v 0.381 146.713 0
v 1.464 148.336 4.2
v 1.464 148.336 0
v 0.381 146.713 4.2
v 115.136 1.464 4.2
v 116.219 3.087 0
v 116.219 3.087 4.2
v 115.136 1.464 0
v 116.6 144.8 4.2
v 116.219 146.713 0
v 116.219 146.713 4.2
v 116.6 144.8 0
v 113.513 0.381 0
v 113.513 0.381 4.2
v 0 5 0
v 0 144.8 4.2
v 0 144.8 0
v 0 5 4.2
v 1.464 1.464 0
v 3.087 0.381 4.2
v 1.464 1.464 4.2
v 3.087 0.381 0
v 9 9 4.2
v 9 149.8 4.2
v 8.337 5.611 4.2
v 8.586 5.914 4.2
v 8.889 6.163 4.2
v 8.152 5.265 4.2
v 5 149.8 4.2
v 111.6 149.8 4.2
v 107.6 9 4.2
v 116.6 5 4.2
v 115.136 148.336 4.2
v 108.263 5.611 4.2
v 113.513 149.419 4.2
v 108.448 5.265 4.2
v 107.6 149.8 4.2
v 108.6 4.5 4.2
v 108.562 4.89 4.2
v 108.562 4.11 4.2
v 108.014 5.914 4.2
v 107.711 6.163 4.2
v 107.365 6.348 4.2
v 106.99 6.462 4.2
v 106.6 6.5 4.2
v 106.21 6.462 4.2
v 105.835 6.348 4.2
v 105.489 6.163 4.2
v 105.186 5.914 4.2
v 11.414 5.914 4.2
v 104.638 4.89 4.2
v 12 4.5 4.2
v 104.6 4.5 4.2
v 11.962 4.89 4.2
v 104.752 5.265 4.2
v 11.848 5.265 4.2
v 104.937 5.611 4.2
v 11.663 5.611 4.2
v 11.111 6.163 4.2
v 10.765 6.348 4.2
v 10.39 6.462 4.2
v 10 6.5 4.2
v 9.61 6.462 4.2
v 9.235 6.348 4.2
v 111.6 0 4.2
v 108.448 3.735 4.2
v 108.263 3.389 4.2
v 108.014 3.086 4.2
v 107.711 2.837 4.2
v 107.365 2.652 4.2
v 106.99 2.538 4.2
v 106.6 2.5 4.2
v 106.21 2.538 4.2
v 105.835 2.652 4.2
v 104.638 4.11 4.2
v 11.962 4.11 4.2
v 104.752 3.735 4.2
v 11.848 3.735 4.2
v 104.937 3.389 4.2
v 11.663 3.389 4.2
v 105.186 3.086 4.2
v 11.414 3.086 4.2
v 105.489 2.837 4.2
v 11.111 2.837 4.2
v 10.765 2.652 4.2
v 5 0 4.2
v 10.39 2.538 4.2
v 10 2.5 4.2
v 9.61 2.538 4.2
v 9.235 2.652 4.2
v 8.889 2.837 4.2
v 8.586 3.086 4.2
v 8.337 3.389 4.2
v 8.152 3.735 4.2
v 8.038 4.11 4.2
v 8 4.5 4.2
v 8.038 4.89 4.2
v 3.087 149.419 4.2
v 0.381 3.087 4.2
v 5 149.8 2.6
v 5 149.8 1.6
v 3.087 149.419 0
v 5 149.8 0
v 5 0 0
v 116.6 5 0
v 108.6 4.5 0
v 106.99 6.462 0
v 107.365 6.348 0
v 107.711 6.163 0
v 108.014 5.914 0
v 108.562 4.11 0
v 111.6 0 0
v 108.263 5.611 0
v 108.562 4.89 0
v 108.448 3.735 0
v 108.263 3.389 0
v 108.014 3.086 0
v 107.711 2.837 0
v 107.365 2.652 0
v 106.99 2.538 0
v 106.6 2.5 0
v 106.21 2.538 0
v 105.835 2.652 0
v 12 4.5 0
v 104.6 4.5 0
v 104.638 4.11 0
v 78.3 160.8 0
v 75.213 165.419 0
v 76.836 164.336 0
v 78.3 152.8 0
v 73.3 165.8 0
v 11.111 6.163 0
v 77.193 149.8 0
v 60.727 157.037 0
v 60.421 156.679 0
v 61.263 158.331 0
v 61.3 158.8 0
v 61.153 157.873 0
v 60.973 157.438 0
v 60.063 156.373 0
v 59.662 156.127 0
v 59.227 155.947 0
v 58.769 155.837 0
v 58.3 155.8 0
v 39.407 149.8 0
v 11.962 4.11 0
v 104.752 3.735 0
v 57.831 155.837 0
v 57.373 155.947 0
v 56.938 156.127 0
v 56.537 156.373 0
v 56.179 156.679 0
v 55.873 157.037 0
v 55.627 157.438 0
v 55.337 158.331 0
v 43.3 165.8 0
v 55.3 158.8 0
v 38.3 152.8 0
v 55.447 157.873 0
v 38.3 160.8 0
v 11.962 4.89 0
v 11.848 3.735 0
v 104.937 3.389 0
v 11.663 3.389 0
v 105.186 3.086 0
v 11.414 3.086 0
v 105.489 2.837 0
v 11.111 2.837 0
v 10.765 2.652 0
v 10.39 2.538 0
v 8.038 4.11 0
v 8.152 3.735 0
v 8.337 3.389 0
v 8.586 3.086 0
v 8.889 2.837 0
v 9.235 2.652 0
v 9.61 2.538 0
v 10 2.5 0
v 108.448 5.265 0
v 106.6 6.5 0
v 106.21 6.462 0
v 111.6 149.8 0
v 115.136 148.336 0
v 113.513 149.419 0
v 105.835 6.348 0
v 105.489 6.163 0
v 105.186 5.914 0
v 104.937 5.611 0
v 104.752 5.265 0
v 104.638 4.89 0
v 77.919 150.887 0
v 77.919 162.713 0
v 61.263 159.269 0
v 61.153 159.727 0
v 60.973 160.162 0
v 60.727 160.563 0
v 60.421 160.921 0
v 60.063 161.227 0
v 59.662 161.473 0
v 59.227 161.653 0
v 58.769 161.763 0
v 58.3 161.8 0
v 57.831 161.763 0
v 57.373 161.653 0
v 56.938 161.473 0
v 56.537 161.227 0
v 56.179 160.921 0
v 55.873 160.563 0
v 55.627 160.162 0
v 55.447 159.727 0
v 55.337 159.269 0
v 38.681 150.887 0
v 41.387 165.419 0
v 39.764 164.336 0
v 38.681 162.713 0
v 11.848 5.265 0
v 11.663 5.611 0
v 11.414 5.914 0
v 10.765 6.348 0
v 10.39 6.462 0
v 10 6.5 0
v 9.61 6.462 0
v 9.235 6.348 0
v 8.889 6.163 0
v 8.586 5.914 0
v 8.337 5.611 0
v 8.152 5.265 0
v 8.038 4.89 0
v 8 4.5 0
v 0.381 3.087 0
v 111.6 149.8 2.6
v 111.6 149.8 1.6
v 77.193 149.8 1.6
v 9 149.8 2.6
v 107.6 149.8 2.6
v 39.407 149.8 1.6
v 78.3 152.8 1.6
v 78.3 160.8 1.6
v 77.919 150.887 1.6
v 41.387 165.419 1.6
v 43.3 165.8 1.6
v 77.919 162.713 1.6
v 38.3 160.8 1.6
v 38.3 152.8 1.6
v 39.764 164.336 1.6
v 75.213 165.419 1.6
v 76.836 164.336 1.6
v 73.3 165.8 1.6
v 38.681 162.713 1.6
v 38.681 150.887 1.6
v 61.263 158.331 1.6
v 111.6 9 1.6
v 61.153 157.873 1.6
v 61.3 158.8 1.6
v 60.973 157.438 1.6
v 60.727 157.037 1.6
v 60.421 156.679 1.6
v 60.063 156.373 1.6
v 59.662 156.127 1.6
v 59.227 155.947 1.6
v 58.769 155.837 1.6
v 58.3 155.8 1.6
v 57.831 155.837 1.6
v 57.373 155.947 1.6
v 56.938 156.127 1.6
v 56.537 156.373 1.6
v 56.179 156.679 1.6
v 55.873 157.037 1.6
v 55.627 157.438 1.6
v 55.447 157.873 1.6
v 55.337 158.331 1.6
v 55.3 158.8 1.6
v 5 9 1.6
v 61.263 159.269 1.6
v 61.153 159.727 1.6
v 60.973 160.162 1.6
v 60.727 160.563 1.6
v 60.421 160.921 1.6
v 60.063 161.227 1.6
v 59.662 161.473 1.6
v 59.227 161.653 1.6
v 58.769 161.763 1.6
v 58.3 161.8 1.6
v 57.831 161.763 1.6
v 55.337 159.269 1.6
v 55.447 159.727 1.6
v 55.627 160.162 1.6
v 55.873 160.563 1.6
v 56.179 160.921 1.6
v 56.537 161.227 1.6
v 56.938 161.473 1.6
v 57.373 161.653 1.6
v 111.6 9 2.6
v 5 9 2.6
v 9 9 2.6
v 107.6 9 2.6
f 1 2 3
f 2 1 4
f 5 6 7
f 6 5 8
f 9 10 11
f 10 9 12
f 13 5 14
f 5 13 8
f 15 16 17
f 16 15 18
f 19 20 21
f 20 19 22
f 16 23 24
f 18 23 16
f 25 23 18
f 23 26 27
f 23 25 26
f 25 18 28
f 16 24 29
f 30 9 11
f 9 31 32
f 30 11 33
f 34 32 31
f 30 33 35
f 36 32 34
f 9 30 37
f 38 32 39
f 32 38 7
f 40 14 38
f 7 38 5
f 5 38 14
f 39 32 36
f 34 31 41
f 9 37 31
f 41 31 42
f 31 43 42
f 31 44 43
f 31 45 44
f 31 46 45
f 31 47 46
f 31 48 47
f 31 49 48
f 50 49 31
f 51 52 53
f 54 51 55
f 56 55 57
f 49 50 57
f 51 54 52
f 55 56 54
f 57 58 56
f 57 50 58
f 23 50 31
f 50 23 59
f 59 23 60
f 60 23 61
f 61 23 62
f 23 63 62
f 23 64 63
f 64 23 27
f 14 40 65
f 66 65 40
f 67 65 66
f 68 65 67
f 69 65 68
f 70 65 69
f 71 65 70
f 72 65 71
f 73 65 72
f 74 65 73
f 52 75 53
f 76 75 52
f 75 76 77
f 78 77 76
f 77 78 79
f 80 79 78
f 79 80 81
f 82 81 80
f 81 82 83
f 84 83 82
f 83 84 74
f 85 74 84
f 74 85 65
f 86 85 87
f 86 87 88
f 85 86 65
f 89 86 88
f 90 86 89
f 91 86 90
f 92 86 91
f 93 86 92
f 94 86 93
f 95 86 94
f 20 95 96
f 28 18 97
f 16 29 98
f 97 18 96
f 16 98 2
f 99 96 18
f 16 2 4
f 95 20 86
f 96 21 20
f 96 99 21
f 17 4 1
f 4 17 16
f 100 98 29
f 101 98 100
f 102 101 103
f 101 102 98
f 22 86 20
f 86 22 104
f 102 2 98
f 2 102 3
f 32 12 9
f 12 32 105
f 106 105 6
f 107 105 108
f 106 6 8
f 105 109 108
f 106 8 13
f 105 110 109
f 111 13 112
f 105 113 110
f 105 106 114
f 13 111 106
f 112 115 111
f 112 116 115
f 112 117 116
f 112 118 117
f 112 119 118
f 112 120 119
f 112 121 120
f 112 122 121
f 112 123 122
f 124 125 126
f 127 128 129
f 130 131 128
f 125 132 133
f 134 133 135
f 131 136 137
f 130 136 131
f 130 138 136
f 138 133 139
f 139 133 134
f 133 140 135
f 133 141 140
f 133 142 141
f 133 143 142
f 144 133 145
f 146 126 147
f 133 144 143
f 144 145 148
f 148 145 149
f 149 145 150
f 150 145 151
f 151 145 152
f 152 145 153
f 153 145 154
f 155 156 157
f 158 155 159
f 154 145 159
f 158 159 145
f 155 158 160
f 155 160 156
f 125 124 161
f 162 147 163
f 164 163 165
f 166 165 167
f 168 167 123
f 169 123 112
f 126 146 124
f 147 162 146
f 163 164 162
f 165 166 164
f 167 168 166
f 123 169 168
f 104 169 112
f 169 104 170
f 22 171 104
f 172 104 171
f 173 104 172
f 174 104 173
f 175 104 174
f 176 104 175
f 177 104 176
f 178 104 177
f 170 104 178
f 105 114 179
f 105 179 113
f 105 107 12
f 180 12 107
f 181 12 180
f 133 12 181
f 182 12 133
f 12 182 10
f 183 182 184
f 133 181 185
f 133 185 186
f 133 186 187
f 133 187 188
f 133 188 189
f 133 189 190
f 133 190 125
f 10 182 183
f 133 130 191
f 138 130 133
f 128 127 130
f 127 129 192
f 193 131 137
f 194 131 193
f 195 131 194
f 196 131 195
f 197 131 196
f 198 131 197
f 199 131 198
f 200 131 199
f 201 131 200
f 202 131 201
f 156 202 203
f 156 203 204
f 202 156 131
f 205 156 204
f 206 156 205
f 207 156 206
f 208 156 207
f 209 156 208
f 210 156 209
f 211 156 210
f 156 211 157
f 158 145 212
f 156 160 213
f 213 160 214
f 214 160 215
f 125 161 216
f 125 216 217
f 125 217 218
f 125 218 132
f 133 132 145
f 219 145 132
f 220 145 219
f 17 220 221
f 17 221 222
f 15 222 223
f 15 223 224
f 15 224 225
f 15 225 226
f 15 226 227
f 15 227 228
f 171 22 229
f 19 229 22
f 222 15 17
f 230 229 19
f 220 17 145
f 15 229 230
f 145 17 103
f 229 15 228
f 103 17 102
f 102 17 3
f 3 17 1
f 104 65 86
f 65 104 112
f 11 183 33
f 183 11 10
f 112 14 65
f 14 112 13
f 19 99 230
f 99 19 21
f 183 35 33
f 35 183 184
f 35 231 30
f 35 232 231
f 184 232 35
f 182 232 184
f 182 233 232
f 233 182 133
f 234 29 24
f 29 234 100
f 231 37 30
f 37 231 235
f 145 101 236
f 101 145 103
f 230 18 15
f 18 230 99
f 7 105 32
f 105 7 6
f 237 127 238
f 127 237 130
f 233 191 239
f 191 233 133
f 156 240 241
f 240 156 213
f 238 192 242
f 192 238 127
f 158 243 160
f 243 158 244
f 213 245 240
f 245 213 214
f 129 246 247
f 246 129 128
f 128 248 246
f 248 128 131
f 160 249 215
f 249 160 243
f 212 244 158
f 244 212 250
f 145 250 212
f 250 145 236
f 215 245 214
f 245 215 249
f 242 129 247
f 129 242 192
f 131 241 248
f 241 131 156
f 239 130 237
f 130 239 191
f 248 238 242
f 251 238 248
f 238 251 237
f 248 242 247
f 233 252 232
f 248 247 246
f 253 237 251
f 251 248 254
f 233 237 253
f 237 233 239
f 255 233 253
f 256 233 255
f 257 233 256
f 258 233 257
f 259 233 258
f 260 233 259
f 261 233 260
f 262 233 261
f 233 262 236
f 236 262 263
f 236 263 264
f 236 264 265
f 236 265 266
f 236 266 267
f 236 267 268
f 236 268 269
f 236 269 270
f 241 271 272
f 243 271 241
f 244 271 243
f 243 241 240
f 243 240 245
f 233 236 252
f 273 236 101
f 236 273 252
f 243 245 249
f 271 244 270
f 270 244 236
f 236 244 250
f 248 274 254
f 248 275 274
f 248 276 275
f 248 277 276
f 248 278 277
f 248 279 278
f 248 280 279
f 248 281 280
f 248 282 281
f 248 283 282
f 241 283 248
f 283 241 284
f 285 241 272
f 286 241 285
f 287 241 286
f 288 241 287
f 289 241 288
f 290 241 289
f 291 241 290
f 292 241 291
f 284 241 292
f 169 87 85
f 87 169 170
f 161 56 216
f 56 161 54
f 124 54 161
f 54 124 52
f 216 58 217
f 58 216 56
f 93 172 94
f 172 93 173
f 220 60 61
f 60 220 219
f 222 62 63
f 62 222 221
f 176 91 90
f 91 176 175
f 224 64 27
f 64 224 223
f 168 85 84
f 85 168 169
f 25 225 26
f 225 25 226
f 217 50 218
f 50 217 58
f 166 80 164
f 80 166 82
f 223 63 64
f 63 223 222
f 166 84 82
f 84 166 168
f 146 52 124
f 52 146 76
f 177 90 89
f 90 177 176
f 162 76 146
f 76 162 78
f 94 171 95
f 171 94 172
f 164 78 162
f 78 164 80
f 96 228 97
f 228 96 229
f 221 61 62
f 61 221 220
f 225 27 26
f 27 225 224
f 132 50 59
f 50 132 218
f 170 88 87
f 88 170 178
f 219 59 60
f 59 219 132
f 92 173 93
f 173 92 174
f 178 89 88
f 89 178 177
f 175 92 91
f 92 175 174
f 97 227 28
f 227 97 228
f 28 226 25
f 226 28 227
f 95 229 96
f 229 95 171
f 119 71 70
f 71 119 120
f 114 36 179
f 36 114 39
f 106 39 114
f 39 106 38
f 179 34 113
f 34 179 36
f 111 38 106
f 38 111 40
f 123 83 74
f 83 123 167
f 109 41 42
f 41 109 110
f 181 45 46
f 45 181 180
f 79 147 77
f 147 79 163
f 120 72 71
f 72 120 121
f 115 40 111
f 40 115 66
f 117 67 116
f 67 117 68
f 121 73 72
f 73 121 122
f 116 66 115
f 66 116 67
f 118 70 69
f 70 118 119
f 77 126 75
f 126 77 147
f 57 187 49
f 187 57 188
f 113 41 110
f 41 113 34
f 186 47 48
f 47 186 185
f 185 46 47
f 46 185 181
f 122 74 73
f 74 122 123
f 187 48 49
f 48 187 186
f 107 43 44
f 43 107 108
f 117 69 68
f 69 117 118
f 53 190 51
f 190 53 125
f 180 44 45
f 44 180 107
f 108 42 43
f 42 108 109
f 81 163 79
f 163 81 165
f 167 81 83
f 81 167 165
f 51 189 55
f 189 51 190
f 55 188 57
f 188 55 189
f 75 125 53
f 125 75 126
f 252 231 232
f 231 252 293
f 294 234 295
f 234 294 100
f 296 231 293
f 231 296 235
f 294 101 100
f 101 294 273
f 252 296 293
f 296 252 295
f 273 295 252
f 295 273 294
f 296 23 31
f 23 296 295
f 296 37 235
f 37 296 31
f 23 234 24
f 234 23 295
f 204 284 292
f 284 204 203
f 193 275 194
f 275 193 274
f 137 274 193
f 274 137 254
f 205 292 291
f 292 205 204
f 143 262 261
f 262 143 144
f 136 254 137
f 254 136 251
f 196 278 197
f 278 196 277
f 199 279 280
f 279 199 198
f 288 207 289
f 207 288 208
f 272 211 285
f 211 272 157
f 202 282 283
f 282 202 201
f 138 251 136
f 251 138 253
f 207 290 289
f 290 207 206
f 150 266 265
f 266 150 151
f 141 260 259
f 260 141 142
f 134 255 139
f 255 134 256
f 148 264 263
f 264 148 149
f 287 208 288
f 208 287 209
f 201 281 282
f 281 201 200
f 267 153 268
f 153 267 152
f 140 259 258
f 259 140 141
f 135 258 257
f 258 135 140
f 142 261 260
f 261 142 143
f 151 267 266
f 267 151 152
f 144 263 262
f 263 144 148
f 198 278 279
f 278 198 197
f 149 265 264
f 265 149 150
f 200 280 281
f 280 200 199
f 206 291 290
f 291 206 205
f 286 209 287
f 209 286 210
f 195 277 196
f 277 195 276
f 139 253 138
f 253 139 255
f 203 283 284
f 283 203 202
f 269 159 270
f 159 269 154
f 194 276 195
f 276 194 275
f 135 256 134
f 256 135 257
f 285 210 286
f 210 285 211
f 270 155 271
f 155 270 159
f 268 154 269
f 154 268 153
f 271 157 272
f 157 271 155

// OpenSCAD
// DEUKRO26 – Hülle für die QR-Karte (Papier/laminiert, A6-Breite)
// Flach drucken (Rückseite auf dem Druckbett). Die Karte wird von oben eingeschoben.
// Alle Maße in mm. Karte messen und unten anpassen.

card_w   = 105;     // Breite der Karte
card_h   = 140;     // Höhe der Karte (wie gedruckt, bei Bedarf messen)
card_t   = 0.6;     // Dicke der Karte (Papier 0.2, laminiert ca. 0.5-0.7)
tol      = 0.8;     // Spiel rundherum
wall     = 5;       // Rahmen außerhalb der Tasche
overlap  = 4;       // Vorderwand überlappt die Karte um so viel (hält sie fest)
back_t   = 1.6;     // Rückwand
front_t  = 1.6;     // Vorderwand
corner   = 5;       // Eckenradius außen
tab_w    = 40;      // Lasche oben für Band/Karabiner (nur Rückwand)
tab_h    = 16;
holes    = true;    // 2 Schraubenlöcher unten für Wandmontage (4 mm)

pocket_w = card_w + tol * 2;
pocket_h = card_h + tol;
pocket_t = card_t + 0.4;
out_w    = pocket_w + wall * 2;
body_h   = pocket_h + wall + overlap;
total_t  = back_t + pocket_t + front_t;

module rrect(w, h, r, t) {
    translate([r, r, 0]) linear_extrude(t)
        offset(r = r) square([w - 2 * r, h - 2 * r]);
}

difference() {
    union() {
        rrect(out_w, body_h, corner, total_t);
        // Lasche oben, nur so dick wie die Rückwand
        translate([out_w / 2 - tab_w / 2, body_h - 2, 0]) rrect(tab_w, tab_h + 2, 5, back_t);
    }
    // Tasche für die Karte, oben offen
    translate([wall, wall + overlap, back_t]) cube([pocket_w, pocket_h + 20, pocket_t]);
    // Sichtfenster vorne (rundum 'overlap' Rand, oben offen)
    translate([wall + overlap, wall + overlap, back_t + pocket_t - 0.01])
        cube([pocket_w - overlap * 2, pocket_h + 20, front_t + 1]);
    // Loch in der Lasche
    translate([out_w / 2, body_h + tab_h / 2 + 1, -1]) cylinder(d = 6, h = total_t + 2, $fn = 40);
    // Schraubenlöcher
    if (holes)
        for (x = [wall + 5, out_w - wall - 5])
            translate([x, (wall + overlap) / 2, -1]) cylinder(d = 4, h = total_t + 2, $fn = 32);
}
